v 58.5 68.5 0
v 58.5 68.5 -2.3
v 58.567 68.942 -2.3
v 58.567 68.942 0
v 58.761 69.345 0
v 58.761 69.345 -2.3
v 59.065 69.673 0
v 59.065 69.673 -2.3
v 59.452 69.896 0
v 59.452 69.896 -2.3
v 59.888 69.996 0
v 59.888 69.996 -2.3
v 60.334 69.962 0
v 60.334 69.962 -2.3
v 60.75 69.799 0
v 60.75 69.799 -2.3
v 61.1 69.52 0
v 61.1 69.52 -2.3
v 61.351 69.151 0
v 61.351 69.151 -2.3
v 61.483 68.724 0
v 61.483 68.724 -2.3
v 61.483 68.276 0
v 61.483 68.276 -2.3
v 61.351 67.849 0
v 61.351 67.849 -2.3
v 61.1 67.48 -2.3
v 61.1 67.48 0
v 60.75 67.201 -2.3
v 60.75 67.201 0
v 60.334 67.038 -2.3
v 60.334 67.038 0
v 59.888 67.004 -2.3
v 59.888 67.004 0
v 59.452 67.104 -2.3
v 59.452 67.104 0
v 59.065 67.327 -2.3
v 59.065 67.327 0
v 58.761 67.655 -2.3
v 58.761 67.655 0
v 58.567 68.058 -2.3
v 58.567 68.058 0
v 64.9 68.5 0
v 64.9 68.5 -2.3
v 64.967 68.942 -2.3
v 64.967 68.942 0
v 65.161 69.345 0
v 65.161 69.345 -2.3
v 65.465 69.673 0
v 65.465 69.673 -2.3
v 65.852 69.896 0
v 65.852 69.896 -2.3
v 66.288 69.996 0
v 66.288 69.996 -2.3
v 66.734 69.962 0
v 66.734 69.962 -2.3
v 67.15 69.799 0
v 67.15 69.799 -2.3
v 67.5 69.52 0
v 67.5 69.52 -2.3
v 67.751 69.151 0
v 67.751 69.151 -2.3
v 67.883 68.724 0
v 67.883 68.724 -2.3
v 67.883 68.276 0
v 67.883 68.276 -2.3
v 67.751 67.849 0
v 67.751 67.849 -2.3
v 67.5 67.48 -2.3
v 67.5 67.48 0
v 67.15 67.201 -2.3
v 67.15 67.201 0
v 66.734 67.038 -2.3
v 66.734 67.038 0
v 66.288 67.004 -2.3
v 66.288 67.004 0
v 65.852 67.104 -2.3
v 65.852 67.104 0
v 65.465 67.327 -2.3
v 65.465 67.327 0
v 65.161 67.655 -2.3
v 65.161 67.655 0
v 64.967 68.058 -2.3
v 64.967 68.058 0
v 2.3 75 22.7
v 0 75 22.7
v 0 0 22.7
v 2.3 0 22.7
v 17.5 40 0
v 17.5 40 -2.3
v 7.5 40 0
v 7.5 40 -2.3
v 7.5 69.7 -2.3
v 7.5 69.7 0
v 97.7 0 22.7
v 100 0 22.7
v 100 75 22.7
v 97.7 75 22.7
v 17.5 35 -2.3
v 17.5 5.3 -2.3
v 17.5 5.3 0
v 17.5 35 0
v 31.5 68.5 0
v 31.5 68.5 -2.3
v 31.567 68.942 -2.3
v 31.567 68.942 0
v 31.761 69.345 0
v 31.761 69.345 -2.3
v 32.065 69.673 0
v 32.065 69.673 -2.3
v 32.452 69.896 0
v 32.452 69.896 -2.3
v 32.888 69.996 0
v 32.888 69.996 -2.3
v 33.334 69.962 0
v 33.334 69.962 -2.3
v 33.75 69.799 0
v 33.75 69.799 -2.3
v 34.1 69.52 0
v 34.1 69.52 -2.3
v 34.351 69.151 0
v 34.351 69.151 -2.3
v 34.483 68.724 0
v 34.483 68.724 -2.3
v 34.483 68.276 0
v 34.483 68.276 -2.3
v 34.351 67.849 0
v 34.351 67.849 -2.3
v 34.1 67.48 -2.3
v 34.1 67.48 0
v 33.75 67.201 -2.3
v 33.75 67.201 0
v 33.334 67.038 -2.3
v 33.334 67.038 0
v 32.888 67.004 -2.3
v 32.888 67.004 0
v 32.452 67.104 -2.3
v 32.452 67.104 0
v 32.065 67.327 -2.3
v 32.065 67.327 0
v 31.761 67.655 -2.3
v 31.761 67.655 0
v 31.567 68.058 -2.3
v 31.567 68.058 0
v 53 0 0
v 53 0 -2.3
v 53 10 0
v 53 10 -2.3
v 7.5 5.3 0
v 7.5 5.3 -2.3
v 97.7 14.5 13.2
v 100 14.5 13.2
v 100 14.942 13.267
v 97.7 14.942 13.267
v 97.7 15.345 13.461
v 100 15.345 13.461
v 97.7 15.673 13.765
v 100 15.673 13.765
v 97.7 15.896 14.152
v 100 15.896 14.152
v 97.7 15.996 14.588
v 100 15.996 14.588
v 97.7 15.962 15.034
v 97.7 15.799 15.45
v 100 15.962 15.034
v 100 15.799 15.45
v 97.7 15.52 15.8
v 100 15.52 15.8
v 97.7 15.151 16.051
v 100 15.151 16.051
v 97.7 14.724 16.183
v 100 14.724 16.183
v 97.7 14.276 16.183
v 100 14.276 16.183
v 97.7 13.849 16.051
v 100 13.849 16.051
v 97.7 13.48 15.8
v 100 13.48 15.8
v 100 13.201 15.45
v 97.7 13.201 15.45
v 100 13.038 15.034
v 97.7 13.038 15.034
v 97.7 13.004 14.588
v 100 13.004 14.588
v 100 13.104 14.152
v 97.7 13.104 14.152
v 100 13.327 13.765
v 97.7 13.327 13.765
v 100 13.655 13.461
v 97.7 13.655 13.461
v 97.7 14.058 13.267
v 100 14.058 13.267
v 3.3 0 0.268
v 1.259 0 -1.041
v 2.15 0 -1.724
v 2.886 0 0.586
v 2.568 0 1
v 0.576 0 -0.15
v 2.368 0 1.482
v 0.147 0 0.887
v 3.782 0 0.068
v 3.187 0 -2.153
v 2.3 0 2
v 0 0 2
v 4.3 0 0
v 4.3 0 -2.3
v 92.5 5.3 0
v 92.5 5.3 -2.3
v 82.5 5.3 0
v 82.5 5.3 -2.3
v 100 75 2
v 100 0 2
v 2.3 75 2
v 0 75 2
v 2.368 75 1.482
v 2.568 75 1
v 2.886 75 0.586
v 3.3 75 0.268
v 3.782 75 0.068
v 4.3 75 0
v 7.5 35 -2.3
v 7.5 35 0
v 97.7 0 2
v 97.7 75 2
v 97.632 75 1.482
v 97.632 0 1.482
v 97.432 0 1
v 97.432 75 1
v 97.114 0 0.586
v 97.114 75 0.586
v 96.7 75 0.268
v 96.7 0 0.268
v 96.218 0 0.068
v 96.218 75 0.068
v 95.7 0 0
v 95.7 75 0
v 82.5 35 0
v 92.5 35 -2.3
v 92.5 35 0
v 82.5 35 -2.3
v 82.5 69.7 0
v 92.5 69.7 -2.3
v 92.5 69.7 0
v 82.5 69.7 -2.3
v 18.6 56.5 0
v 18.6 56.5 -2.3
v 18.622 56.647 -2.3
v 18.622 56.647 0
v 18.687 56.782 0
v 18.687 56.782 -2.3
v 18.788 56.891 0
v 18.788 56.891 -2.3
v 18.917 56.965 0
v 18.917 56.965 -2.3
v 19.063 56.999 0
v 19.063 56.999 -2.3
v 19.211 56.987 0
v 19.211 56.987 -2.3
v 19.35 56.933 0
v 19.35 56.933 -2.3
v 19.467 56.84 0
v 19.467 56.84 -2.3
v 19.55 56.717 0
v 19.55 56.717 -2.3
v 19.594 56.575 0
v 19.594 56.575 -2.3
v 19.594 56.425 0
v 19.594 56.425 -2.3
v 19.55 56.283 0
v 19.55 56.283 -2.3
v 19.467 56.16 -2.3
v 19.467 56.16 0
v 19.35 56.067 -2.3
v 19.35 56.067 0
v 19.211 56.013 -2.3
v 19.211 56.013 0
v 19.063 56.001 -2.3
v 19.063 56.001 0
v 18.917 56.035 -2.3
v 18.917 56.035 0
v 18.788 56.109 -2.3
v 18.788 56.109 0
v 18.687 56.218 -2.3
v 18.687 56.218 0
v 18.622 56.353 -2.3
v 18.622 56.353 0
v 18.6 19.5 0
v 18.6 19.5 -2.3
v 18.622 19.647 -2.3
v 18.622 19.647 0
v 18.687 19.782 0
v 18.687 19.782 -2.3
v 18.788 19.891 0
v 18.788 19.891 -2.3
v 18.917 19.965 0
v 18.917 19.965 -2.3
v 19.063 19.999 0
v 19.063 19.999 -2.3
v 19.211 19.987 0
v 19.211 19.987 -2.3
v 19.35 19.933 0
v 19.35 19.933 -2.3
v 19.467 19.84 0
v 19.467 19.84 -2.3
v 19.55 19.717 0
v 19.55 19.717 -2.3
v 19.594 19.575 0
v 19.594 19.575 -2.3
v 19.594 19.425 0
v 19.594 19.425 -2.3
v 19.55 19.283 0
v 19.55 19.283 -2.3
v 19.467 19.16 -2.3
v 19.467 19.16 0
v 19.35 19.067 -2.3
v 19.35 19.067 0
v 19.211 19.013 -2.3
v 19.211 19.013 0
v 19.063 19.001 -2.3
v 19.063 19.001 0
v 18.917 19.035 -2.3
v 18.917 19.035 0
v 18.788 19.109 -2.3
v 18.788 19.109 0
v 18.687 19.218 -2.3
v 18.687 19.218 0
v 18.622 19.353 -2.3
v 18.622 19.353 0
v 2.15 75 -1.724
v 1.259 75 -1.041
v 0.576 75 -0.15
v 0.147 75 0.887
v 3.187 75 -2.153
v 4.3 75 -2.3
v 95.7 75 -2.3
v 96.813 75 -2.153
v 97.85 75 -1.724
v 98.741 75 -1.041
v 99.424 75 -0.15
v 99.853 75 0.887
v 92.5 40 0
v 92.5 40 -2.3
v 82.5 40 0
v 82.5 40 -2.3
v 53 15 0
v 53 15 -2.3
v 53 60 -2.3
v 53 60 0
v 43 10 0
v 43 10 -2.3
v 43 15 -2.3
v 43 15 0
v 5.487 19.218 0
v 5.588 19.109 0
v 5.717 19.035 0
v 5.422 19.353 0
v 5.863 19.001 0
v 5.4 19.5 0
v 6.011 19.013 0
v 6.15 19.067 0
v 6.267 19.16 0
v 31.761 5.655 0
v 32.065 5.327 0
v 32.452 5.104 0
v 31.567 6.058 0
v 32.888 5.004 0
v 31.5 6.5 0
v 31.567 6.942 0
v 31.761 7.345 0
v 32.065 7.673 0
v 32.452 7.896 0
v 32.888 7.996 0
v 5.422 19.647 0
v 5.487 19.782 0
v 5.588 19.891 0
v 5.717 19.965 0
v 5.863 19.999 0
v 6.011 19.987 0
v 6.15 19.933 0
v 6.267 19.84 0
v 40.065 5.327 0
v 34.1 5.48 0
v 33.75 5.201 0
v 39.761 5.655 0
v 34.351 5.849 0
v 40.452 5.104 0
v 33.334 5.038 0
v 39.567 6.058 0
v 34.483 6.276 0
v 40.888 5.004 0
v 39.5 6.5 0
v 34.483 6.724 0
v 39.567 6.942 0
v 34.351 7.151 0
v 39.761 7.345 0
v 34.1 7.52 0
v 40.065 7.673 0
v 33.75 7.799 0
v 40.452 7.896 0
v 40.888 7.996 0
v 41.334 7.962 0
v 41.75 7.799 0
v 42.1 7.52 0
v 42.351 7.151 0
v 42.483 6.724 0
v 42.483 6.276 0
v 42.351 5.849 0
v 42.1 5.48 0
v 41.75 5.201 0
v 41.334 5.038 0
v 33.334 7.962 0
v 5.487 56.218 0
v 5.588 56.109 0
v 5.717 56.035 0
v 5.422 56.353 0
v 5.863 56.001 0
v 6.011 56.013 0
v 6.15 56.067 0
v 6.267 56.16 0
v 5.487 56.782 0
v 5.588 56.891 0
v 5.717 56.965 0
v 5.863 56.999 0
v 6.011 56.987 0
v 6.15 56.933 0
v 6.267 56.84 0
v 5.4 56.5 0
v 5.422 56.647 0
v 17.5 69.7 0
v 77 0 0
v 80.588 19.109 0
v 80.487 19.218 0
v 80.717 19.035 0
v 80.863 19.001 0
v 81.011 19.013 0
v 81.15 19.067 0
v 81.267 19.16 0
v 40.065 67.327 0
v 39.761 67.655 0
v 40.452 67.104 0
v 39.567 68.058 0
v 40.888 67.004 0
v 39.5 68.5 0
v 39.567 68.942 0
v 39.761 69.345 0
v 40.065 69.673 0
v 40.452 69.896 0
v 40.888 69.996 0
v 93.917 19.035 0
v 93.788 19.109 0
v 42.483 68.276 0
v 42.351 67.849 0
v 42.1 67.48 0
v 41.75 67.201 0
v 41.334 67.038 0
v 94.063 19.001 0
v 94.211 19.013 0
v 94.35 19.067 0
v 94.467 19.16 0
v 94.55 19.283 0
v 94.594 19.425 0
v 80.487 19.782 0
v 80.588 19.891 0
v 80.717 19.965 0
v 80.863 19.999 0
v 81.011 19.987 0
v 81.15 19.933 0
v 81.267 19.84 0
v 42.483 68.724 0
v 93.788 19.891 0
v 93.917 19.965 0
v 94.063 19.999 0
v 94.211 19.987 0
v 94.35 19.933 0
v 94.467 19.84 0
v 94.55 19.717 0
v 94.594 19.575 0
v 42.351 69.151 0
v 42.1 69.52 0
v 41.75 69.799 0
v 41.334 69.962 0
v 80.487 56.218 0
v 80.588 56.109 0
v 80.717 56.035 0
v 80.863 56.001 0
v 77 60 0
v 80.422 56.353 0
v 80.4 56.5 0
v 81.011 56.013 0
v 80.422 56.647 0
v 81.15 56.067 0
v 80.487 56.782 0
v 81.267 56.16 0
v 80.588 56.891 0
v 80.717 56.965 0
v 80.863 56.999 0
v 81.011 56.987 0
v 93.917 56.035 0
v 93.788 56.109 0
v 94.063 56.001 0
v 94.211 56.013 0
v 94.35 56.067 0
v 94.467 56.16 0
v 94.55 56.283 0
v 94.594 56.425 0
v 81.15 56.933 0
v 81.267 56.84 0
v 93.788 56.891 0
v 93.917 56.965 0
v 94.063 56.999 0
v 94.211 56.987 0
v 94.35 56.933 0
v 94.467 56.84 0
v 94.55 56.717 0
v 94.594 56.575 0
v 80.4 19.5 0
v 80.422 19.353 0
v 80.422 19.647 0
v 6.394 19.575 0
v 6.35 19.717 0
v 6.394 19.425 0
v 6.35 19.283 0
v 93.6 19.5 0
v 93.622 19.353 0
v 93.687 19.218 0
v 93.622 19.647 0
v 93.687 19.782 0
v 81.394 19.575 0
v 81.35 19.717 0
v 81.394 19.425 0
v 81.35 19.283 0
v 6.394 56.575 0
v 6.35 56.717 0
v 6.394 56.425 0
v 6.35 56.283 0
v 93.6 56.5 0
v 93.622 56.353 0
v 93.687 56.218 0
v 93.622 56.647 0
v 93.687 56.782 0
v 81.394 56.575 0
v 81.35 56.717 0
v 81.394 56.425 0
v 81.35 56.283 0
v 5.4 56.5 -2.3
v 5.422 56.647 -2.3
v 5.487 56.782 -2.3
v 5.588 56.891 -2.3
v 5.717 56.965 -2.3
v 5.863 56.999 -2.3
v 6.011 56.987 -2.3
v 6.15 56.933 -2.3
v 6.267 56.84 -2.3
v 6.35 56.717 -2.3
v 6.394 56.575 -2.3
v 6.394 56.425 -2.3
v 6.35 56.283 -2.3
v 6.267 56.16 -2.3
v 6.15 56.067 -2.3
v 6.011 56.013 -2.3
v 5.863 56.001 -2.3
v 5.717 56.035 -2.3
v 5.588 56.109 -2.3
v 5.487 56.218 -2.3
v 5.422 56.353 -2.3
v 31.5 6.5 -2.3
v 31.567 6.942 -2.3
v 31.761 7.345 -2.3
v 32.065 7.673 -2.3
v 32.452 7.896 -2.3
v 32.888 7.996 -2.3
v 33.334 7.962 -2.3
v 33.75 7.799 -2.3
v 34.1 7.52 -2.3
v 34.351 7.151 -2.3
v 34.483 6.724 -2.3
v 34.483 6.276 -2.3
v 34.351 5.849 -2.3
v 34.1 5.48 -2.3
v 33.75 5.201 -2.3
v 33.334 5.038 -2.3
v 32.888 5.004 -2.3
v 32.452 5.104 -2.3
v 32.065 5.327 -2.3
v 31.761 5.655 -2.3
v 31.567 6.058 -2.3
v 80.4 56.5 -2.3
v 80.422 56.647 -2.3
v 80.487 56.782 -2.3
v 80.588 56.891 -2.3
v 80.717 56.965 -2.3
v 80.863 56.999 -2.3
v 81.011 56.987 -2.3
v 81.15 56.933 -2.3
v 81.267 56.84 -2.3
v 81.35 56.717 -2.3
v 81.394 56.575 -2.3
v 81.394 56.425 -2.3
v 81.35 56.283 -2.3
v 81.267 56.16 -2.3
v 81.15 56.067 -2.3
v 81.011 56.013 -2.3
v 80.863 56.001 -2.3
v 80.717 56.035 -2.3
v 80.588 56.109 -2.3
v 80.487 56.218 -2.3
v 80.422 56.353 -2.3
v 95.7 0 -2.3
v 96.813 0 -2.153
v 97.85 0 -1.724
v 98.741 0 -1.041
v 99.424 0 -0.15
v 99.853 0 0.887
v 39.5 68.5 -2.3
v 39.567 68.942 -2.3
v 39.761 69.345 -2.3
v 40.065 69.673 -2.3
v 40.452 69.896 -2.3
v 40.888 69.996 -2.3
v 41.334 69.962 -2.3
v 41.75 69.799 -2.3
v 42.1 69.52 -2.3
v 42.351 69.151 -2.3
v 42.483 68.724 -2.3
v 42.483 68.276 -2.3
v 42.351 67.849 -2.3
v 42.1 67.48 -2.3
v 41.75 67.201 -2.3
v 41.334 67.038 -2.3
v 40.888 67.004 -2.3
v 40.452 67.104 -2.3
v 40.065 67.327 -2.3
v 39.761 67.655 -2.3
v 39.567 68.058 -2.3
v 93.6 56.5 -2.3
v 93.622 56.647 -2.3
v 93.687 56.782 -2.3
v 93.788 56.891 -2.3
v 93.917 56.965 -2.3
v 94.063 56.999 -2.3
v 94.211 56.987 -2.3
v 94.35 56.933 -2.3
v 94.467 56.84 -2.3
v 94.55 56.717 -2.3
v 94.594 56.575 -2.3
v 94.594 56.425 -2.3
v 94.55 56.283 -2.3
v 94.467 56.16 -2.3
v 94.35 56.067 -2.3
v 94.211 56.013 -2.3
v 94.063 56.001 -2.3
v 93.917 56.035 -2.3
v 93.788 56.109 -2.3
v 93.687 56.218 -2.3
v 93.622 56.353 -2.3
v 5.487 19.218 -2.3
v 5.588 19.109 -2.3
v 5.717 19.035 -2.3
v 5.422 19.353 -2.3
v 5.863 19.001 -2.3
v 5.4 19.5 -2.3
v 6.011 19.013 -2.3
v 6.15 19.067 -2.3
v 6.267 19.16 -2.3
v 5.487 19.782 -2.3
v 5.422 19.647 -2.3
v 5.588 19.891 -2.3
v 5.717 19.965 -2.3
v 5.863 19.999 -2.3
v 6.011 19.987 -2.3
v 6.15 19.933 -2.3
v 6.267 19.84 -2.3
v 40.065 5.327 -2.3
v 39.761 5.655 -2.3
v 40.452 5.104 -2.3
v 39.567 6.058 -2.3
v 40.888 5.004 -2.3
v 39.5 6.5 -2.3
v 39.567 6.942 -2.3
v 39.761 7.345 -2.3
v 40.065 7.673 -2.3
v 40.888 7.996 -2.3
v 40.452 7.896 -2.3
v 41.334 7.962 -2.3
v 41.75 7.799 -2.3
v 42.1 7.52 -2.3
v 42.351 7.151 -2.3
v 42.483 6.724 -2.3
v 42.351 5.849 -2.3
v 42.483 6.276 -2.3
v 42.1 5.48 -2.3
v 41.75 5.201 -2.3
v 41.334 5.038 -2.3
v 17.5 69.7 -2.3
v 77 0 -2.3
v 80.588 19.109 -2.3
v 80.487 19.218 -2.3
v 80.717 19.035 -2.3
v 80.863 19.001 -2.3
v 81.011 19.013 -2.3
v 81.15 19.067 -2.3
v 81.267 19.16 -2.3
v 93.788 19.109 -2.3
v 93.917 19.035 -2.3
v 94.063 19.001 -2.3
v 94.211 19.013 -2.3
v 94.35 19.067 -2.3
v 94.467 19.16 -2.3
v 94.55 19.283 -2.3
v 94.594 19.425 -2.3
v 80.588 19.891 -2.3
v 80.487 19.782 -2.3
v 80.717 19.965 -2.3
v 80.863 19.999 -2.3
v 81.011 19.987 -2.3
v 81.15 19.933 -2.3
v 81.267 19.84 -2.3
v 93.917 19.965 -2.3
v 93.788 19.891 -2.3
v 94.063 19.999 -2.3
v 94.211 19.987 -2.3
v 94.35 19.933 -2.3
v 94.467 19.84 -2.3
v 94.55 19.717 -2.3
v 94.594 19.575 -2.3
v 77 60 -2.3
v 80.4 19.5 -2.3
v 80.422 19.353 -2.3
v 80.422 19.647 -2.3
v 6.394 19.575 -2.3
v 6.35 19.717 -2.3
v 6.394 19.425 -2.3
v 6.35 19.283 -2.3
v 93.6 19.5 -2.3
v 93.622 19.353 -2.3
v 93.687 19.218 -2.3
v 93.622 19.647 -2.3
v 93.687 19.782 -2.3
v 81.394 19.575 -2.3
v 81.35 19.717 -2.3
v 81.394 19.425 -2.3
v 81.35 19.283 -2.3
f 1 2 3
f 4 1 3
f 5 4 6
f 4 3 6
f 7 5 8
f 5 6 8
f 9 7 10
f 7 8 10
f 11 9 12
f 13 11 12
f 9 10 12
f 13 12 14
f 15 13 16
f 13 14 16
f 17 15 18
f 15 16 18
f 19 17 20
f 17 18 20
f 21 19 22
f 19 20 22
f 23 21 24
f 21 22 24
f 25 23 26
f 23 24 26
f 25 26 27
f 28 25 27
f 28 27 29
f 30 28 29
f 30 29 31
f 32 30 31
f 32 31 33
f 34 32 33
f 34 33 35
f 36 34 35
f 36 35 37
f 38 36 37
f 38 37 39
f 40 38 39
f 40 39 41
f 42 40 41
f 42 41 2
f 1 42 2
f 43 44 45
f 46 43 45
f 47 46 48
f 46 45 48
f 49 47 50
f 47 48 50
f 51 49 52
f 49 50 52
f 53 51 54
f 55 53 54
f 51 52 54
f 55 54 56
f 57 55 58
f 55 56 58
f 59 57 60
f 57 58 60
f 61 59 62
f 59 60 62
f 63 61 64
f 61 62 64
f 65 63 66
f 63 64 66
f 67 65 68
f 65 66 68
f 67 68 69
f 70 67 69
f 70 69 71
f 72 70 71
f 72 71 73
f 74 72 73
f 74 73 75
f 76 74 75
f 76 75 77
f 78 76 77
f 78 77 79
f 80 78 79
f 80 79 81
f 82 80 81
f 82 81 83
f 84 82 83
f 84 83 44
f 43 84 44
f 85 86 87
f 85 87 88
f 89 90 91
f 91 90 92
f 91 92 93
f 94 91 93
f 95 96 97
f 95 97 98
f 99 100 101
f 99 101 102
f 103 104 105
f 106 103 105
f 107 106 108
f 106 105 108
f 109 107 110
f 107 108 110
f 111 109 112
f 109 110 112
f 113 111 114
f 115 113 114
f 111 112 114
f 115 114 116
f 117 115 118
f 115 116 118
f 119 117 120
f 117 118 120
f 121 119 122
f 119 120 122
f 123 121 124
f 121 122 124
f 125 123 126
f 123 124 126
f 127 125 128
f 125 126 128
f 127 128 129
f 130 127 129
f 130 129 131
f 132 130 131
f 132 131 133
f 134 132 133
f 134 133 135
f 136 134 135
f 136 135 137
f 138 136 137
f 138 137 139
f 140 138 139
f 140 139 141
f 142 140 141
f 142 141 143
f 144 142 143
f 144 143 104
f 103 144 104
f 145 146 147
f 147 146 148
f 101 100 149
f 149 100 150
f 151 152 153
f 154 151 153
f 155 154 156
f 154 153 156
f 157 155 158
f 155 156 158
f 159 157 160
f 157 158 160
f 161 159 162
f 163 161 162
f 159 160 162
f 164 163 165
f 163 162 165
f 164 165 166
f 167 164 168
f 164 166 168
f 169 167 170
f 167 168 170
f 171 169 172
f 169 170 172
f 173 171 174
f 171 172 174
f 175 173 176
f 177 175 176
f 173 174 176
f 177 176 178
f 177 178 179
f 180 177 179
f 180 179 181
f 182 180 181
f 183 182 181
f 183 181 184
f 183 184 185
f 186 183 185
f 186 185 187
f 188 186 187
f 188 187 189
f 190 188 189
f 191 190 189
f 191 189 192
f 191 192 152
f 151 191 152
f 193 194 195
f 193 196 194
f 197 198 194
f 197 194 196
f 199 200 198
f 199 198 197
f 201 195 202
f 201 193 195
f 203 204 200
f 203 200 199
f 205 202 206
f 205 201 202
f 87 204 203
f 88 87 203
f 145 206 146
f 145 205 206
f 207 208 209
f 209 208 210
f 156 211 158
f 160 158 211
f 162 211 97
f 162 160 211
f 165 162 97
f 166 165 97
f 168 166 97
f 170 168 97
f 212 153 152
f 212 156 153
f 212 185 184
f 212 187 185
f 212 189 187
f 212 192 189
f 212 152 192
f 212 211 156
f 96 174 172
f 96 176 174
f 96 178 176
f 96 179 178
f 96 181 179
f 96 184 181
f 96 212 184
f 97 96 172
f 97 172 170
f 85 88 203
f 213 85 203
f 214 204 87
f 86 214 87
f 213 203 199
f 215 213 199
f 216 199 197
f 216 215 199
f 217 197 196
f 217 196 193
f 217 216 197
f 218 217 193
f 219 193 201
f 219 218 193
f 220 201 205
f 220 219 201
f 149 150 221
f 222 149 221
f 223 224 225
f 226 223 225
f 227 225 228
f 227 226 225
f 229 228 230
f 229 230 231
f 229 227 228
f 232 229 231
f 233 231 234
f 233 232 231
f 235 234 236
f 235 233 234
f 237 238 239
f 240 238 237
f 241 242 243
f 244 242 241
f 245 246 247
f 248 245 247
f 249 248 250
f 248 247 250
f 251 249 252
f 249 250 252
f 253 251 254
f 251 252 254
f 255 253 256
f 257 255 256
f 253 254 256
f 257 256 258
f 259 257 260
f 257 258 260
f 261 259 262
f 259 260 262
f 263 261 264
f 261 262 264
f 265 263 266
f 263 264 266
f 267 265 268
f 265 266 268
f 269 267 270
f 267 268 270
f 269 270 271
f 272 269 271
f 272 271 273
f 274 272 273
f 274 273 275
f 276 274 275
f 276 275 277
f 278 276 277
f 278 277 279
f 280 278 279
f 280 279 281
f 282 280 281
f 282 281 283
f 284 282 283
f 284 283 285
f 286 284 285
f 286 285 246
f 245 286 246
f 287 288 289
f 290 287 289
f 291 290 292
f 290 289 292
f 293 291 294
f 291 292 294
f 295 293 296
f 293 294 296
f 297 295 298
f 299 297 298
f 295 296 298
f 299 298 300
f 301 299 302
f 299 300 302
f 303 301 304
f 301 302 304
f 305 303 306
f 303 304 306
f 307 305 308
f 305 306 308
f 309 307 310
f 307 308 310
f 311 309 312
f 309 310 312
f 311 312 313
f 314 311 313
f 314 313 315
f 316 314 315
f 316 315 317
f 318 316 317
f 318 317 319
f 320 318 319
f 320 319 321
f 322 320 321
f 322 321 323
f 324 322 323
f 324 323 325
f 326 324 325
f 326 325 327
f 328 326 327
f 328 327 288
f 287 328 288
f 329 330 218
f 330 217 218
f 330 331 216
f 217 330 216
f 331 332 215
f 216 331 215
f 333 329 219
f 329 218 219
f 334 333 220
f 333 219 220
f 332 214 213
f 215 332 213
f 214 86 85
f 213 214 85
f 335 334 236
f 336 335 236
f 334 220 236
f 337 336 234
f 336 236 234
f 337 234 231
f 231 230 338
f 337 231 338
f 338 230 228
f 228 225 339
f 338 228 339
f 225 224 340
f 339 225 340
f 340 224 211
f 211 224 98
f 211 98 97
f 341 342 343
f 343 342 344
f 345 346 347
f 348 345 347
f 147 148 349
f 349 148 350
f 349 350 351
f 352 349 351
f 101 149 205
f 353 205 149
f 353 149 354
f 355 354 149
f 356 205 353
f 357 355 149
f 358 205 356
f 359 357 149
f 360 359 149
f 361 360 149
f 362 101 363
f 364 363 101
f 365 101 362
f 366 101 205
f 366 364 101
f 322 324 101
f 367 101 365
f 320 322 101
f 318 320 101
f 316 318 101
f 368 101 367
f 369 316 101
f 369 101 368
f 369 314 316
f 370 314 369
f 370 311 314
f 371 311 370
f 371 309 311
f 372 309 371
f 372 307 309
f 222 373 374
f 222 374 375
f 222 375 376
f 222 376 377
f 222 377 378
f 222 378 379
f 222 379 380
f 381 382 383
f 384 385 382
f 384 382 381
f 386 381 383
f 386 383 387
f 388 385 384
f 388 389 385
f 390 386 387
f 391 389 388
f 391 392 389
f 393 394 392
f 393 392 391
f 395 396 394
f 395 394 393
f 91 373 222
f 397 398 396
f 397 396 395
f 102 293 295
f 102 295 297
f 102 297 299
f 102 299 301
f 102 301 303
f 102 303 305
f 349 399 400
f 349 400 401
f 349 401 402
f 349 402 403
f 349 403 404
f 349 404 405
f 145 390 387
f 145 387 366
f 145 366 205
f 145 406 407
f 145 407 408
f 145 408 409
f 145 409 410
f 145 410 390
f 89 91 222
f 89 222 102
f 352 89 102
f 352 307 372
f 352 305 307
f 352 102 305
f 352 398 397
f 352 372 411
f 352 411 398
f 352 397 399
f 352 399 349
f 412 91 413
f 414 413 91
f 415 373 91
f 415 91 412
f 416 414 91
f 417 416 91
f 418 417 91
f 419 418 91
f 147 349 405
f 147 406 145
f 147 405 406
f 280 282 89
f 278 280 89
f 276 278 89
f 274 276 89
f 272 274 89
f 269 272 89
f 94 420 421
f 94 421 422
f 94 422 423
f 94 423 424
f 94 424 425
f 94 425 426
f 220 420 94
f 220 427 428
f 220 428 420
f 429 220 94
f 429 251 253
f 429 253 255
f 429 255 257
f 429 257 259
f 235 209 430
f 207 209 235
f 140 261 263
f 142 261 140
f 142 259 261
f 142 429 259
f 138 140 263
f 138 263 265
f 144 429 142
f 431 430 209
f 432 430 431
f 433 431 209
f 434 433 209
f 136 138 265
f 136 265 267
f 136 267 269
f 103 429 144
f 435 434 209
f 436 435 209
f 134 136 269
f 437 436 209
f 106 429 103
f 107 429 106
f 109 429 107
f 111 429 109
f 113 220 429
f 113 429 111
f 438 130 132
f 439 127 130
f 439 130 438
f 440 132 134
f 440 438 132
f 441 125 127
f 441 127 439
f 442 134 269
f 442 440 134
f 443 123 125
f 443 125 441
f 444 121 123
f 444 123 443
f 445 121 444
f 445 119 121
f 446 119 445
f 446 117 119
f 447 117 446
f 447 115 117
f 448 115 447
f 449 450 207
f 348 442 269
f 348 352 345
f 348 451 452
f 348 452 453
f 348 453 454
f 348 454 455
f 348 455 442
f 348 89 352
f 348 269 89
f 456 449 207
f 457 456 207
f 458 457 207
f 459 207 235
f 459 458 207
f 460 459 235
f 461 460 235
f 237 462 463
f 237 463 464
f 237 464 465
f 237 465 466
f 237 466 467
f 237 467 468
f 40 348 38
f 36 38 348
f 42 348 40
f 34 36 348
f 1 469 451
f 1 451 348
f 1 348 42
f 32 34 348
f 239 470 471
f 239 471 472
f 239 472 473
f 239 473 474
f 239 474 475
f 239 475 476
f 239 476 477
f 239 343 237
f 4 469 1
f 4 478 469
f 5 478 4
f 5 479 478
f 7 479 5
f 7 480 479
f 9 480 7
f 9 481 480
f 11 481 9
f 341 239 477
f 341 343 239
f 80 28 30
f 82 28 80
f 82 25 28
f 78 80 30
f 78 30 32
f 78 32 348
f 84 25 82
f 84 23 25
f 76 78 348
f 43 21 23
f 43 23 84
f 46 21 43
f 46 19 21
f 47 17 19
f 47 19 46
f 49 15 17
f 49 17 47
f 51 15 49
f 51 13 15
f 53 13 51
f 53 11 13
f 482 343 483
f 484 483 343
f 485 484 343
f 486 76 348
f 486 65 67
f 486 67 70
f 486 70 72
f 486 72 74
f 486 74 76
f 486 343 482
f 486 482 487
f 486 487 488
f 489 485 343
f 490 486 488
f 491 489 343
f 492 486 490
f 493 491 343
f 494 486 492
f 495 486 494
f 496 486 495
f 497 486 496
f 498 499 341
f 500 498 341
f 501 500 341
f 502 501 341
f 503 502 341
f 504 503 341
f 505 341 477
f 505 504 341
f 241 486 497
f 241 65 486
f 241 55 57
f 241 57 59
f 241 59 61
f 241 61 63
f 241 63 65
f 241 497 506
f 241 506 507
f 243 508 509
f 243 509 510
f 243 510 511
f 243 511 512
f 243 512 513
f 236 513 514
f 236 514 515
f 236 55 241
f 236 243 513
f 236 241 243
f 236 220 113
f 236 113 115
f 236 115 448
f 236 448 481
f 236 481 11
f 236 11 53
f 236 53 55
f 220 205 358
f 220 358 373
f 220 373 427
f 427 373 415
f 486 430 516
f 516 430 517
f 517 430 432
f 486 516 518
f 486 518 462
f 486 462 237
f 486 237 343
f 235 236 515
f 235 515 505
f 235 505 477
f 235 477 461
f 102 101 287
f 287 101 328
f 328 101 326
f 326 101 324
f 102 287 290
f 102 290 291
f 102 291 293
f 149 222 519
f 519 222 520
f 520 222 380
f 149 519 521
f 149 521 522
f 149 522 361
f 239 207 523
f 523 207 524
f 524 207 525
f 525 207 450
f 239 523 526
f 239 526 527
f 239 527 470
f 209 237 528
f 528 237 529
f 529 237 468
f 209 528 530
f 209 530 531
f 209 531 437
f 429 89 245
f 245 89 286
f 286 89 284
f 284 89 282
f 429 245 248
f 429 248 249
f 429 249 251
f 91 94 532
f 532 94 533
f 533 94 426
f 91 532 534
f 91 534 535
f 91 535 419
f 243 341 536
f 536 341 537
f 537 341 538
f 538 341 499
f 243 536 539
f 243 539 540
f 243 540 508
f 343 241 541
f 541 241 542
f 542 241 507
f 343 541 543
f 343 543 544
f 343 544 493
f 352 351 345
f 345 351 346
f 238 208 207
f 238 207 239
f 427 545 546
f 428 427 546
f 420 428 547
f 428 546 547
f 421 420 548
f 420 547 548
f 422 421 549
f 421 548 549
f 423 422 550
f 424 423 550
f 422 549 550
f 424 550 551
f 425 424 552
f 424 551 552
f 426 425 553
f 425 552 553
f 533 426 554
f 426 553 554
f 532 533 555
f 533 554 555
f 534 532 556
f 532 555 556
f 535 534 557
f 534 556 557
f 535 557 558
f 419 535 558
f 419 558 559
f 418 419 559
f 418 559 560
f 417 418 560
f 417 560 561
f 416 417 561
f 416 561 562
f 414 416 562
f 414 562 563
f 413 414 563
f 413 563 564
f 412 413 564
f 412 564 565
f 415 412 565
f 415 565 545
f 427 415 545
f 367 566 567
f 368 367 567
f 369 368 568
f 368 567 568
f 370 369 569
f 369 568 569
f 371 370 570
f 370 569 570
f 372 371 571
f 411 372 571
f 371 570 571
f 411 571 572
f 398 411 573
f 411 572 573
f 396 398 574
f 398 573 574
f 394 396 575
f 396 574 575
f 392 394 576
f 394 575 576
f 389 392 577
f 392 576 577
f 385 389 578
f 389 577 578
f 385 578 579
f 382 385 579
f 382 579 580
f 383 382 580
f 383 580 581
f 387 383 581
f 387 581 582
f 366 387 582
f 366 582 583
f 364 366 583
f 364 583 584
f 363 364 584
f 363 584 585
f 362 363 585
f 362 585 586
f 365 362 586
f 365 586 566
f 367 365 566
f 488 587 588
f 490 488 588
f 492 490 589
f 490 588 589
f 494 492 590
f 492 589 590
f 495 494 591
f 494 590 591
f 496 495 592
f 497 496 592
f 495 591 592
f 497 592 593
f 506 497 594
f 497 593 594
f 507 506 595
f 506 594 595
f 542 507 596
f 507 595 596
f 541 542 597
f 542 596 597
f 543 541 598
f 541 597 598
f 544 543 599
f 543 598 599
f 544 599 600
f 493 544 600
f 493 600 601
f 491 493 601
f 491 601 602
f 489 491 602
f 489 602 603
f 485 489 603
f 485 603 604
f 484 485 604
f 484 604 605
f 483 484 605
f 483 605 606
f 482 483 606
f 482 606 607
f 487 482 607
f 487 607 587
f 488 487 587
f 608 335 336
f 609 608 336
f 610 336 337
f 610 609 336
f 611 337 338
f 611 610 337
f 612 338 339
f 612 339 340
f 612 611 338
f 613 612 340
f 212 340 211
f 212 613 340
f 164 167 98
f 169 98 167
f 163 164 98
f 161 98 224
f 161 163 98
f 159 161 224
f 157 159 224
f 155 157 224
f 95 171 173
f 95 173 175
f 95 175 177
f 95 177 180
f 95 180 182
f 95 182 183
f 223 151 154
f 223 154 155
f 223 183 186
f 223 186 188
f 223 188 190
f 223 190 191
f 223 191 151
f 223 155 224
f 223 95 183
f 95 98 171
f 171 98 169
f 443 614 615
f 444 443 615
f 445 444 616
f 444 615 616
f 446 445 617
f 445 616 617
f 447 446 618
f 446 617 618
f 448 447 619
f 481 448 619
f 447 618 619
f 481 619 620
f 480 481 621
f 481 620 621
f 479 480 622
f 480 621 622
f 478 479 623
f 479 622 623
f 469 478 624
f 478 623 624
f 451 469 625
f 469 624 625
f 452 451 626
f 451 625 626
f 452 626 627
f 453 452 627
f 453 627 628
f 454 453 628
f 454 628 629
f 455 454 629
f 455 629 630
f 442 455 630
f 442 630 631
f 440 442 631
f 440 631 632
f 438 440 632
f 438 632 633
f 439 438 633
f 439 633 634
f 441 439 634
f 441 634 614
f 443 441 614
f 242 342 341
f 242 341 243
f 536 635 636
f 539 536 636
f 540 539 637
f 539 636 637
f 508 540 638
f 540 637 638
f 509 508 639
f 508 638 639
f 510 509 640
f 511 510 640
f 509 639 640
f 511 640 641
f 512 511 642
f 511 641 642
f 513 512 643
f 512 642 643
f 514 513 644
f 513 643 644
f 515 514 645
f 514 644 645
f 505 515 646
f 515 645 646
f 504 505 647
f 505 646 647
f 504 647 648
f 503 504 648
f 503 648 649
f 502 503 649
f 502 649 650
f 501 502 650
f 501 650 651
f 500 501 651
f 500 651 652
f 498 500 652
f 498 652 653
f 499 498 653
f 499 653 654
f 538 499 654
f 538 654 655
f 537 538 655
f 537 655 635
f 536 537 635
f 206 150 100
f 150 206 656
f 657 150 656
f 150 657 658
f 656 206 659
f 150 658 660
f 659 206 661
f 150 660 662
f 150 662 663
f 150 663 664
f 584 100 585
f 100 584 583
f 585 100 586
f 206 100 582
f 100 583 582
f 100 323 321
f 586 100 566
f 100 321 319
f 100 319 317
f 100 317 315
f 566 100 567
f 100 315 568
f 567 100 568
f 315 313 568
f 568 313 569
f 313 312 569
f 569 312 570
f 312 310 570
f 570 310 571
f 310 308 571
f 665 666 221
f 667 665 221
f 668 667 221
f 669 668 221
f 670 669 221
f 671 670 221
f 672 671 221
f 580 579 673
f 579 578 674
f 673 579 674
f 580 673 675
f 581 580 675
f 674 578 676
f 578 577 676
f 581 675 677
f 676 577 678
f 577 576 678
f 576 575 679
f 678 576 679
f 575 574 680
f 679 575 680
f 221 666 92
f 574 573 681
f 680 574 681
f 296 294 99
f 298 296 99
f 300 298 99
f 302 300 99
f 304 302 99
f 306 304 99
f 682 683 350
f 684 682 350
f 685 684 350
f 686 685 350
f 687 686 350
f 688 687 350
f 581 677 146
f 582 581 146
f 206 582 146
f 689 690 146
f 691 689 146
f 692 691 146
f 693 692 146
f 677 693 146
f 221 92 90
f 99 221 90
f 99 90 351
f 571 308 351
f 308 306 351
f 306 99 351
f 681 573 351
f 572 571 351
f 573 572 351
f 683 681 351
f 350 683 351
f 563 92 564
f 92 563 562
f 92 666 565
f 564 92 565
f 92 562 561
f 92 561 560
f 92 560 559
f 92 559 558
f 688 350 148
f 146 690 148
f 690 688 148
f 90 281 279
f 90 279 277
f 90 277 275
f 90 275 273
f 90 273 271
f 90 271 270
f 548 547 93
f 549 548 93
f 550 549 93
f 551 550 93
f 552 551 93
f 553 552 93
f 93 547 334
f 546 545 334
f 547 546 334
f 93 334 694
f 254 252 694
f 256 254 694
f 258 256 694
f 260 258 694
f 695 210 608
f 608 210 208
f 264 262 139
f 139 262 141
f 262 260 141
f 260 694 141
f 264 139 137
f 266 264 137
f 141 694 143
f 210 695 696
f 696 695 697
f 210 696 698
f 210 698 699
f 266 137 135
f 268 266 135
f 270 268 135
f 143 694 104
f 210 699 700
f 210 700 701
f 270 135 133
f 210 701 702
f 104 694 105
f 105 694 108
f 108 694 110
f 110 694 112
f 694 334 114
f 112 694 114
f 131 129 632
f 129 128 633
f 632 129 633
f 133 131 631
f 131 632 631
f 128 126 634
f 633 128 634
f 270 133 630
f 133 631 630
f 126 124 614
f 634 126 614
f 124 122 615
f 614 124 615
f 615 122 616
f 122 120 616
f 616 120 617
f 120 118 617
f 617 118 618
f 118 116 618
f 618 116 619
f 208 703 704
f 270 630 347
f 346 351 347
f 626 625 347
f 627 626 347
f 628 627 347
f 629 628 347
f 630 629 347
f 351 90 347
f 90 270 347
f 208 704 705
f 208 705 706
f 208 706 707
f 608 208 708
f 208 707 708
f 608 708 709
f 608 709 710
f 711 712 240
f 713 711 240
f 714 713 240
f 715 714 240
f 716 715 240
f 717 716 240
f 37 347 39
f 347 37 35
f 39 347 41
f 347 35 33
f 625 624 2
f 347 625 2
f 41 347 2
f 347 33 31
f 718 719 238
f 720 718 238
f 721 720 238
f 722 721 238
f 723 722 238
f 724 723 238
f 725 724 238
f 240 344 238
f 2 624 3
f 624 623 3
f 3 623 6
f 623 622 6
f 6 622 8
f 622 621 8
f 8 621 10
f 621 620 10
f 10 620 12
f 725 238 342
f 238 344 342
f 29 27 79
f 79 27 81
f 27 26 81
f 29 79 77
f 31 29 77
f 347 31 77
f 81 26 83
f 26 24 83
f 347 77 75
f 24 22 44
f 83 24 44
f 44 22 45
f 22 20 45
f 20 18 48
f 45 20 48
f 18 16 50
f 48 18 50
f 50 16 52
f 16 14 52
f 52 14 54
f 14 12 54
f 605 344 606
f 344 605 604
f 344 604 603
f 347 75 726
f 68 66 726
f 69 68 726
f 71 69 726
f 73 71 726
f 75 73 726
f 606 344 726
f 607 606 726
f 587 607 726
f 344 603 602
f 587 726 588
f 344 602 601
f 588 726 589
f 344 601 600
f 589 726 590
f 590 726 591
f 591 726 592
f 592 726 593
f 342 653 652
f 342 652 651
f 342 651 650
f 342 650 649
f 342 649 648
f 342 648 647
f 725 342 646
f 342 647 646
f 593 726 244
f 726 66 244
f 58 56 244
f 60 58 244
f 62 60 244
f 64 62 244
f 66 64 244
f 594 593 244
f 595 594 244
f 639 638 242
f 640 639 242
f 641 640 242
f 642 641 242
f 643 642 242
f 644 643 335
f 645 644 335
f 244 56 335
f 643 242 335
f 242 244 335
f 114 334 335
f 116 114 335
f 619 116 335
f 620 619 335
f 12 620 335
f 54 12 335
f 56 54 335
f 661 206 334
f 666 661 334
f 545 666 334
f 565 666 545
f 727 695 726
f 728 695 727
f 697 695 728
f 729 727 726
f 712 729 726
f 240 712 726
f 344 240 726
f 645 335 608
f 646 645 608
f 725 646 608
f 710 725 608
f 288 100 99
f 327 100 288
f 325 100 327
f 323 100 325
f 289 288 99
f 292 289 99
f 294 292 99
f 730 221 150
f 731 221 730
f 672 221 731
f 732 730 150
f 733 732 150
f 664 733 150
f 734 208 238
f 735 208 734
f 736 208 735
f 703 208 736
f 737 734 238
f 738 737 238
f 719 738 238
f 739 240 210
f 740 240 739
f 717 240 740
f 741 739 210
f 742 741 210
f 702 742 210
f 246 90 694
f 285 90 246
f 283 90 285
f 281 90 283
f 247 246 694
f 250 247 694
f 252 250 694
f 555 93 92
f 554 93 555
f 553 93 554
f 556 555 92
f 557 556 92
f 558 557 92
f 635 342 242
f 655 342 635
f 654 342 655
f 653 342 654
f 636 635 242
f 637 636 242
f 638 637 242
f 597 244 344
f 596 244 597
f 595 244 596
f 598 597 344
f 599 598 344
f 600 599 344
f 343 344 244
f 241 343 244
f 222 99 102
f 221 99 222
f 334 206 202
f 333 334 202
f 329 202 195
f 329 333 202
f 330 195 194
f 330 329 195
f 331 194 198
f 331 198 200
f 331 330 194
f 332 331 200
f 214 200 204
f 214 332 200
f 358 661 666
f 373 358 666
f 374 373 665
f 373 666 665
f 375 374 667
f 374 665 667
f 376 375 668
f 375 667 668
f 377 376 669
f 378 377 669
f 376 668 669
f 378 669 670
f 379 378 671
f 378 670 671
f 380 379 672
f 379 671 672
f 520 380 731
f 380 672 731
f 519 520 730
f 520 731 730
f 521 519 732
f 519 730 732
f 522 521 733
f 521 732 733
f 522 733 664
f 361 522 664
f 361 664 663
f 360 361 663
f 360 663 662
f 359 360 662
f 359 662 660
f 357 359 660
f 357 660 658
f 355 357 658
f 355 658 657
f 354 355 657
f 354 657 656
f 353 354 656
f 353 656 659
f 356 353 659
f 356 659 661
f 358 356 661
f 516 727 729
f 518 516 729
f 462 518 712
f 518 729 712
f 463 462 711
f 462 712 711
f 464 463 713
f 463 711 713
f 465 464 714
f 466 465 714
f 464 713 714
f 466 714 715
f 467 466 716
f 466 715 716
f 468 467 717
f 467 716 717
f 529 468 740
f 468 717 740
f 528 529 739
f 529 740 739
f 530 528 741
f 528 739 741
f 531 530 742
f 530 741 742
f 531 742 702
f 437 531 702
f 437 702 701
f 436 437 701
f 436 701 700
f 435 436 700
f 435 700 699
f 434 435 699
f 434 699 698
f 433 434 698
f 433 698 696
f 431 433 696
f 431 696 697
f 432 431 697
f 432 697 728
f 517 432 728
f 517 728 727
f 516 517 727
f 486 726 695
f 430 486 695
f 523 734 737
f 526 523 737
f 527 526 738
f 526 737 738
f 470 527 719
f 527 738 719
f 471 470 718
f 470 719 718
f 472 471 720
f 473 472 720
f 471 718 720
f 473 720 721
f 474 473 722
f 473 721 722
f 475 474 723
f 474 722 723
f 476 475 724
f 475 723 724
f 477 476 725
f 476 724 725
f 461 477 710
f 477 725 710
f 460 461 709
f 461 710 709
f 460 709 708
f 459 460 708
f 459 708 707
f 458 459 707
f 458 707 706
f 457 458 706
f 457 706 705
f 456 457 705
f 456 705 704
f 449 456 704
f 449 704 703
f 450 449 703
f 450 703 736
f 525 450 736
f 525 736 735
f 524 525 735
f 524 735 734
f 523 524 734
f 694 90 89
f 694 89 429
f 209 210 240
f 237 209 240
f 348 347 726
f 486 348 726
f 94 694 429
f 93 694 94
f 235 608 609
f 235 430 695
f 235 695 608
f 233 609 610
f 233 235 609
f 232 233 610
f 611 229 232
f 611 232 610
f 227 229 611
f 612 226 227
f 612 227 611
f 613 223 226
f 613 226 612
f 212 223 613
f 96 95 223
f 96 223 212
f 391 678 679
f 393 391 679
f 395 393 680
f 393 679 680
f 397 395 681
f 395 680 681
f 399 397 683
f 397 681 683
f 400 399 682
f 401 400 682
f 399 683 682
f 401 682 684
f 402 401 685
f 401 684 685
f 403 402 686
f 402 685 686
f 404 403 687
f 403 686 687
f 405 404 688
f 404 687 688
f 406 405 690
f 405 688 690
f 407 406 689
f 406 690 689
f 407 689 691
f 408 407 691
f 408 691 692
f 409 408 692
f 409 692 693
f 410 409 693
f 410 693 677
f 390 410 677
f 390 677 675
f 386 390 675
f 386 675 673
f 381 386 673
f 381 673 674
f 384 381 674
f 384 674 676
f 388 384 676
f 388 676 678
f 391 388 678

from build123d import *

# Parameters (mm, degrees)
SKETCH2_W                    = 100
SKETCH2_H                    = 75
BASE_FLANGE1_DEPTH           = 2.3
EDGE_FLANGE1_STRIP_W         = 13.2
EDGE_FLANGE1_STRIP_H         = 2.3
EDGE_FLANGE1_STRIP_CUT_DEPTH = 75
EDGE_FLANGE1_DEPTH           = 75
EDGE_FLANGE2_STRIP_W         = 13.2
EDGE_FLANGE2_STRIP_H         = 2.3
EDGE_FLANGE2_STRIP_CUT_DEPTH = 75
EDGE_FLANGE2_DEPTH           = 75
CUT_EXTRUDE1_REACH           = 129.475
SKETCH13_R                   = 1.5
SKETCH13_W                   = 10
SKETCH13_H                   = 64.4
SKETCH14_W                   = 10
SKETCH14_H                   = 5
TAB1_DEPTH                   = 2.3
CUT_EXTRUDE2_REACH           = 129.475
SKETCH17_R                   = 0.5
CUT_EXTRUDE3_REACH           = 129.044
SKETCH18_R                   = 1.5


# Sheet-metal steps are written as plain solids
with BuildPart() as part:
    # Sketch2 → Base-Flange1 (new body)
    with BuildSketch(Plane.XY):
        with Locations((50, 37.5)):
            Rectangle(SKETCH2_W, SKETCH2_H)
    extrude(amount=-BASE_FLANGE1_DEPTH)

    # Edge-Flange1 strip (across the edge) → Edge-Flange1 strip cut (cut)
    with BuildSketch(Plane.XZ.offset(-75)):
        with Locations((-2.3, -1.15)):
            Rectangle(EDGE_FLANGE1_STRIP_W, EDGE_FLANGE1_STRIP_H)
    extrude(amount=EDGE_FLANGE1_STRIP_CUT_DEPTH, mode=Mode.SUBTRACT)

    # Edge-Flange1 section (across the edge) → Edge-Flange1 (add)
    with BuildSketch(Plane.XZ.offset(-75)):
        with BuildLine():
            Line((0, 2), (0, 22.7))
            Line((0, 22.7), (2.3, 22.7))
            Line((2.3, 22.7), (2.3, 2))
            ThreePointArc((2.3, 2), (2.885786438, 0.585786438), (4.3, 0))
            Line((4.3, 0), (4.3, -2.3))
            ThreePointArc((4.3, -2.3), (1.259440841, -1.040559159), (0, 2))
        make_face()
    extrude(amount=EDGE_FLANGE1_DEPTH)

    # Edge-Flange2 strip (across the edge) → Edge-Flange2 strip cut (cut)
    with BuildSketch(Plane(origin=(100, 0, 0), x_dir=(-1, 0, 0), z_dir=(0, 1, 0))):
        with Locations((-2.3, -1.15)):
            Rectangle(EDGE_FLANGE2_STRIP_W, EDGE_FLANGE2_STRIP_H)
    extrude(amount=EDGE_FLANGE2_STRIP_CUT_DEPTH, mode=Mode.SUBTRACT)

    # Edge-Flange2 section (across the edge) → Edge-Flange2 (add)
    with BuildSketch(Plane(origin=(100, 0, 0), x_dir=(-1, 0, 0), z_dir=(0, 1, 0))):
        with BuildLine():
            Line((0, 2), (0, 22.7))
            Line((0, 22.7), (2.3, 22.7))
            Line((2.3, 22.7), (2.3, 2))
            ThreePointArc((2.3, 2), (2.885786438, 0.585786438), (4.3, 0))
            Line((4.3, 0), (4.3, -2.3))
            ThreePointArc((4.3, -2.3), (1.259440841, -1.040559159), (0, 2))
        make_face()
    extrude(amount=EDGE_FLANGE2_DEPTH)

    # Sketch13 → Cut-Extrude1 (cut, up to next)
    with BuildSketch(Plane(origin=(0, 0, -2.3), x_dir=(-1, 0, 0), z_dir=(0, 0, -1)), mode=Mode.PRIVATE) as cut_extrude1_sk1:
        with Locations((-66.4, 68.5)):
            Circle(SKETCH13_R)
    cut_extrude1_tool1 = extrude(cut_extrude1_sk1.sketch, amount=-CUT_EXTRUDE1_REACH, mode=Mode.PRIVATE) & part.part
    # Sketch13 → Cut-Extrude1 (cut, up to next)
    with BuildSketch(Plane(origin=(0, 0, -2.3), x_dir=(-1, 0, 0), z_dir=(0, 0, -1)), mode=Mode.PRIVATE) as cut_extrude1_sk2:
        with Locations((-60, 68.5)):
            Circle(SKETCH13_R)
    cut_extrude1_tool2 = extrude(cut_extrude1_sk2.sketch, amount=-CUT_EXTRUDE1_REACH, mode=Mode.PRIVATE) & part.part
    # Sketch13 → Cut-Extrude1 (cut, up to next)
    with BuildSketch(Plane(origin=(0, 0, -2.3), x_dir=(-1, 0, 0), z_dir=(0, 0, -1)), mode=Mode.PRIVATE) as cut_extrude1_sk3:
        with Locations((-41, 68.5)):
            Circle(SKETCH13_R)
    cut_extrude1_tool3 = extrude(cut_extrude1_sk3.sketch, amount=-CUT_EXTRUDE1_REACH, mode=Mode.PRIVATE) & part.part
    # Sketch13 → Cut-Extrude1 (cut, up to next)
    with BuildSketch(Plane(origin=(0, 0, -2.3), x_dir=(-1, 0, 0), z_dir=(0, 0, -1)), mode=Mode.PRIVATE) as cut_extrude1_sk4:
        with Locations((-33, 68.5)):
            Circle(SKETCH13_R)
    cut_extrude1_tool4 = extrude(cut_extrude1_sk4.sketch, amount=-CUT_EXTRUDE1_REACH, mode=Mode.PRIVATE) & part.part
    # Sketch13 → Cut-Extrude1 (cut, up to next)
    with BuildSketch(Plane(origin=(0, 0, -2.3), x_dir=(-1, 0, 0), z_dir=(0, 0, -1)), mode=Mode.PRIVATE) as cut_extrude1_sk5:
        with Locations((-41, 6.5)):
            Circle(SKETCH13_R)
    cut_extrude1_tool5 = extrude(cut_extrude1_sk5.sketch, amount=-CUT_EXTRUDE1_REACH, mode=Mode.PRIVATE) & part.part
    # Sketch13 → Cut-Extrude1 (cut, up to next)
    with BuildSketch(Plane(origin=(0, 0, -2.3), x_dir=(-1, 0, 0), z_dir=(0, 0, -1)), mode=Mode.PRIVATE) as cut_extrude1_sk6:
        with Locations((-33, 6.5)):
            Circle(SKETCH13_R)
    cut_extrude1_tool6 = extrude(cut_extrude1_sk6.sketch, amount=-CUT_EXTRUDE1_REACH, mode=Mode.PRIVATE) & part.part
    # Sketch13 → Cut-Extrude1 (cut, up to next)
    with BuildSketch(Plane(origin=(0, 0, -2.3), x_dir=(-1, 0, 0), z_dir=(0, 0, -1)), mode=Mode.PRIVATE) as cut_extrude1_sk7:
        Polygon((-77, 0), (-53, 0), (-53, 10), (-43, 10), (-43, 15), (-53, 15), (-53, 60), (-77, 60), align=None)
    cut_extrude1_tool7 = extrude(cut_extrude1_sk7.sketch, amount=-CUT_EXTRUDE1_REACH, mode=Mode.PRIVATE) & part.part
    # Sketch13 → Cut-Extrude1 (cut, up to next)
    with BuildSketch(Plane(origin=(0, 0, -2.3), x_dir=(-1, 0, 0), z_dir=(0, 0, -1)), mode=Mode.PRIVATE) as cut_extrude1_sk8:
        with Locations((-87.5, 37.5)):
            Rectangle(SKETCH13_W, SKETCH13_H)
    cut_extrude1_tool8 = extrude(cut_extrude1_sk8.sketch, amount=-CUT_EXTRUDE1_REACH, mode=Mode.PRIVATE) & part.part
    # Sketch13 → Cut-Extrude1 (cut, up to next)
    with BuildSketch(Plane(origin=(0, 0, -2.3), x_dir=(-1, 0, 0), z_dir=(0, 0, -1)), mode=Mode.PRIVATE) as cut_extrude1_sk9:
        with Locations((-12.5, 37.5)):
            Rectangle(SKETCH13_W, SKETCH13_H)
    cut_extrude1_tool9 = extrude(cut_extrude1_sk9.sketch, amount=-CUT_EXTRUDE1_REACH, mode=Mode.PRIVATE) & part.part
    add(cut_extrude1_tool1.solids().sort_by_distance((66.4, 68.5, -2.3))[0], mode=Mode.SUBTRACT)
    add(cut_extrude1_tool2.solids().sort_by_distance((60, 68.5, -2.3))[0], mode=Mode.SUBTRACT)
    add(cut_extrude1_tool3.solids().sort_by_distance((41, 68.5, -2.3))[0], mode=Mode.SUBTRACT)
    add(cut_extrude1_tool4.solids().sort_by_distance((33, 68.5, -2.3))[0], mode=Mode.SUBTRACT)
    add(cut_extrude1_tool5.solids().sort_by_distance((41, 6.5, -2.3))[0], mode=Mode.SUBTRACT)
    add(cut_extrude1_tool6.solids().sort_by_distance((33, 6.5, -2.3))[0], mode=Mode.SUBTRACT)
    add(cut_extrude1_tool7.solids().sort_by_distance((64.42953, 29.412752, -2.3))[0], mode=Mode.SUBTRACT)
    add(cut_extrude1_tool8.solids().sort_by_distance((87.5, 37.5, -2.3))[0], mode=Mode.SUBTRACT)
    add(cut_extrude1_tool9.solids().sort_by_distance((12.5, 37.5, -2.3))[0], mode=Mode.SUBTRACT)

    # Sketch14 → Tab1 (add)
    with BuildSketch(Plane(origin=(0, 0, -2.3), x_dir=(-1, 0, 0), z_dir=(0, 0, -1))):
        with Locations((-87.5, 37.5)):
            Rectangle(SKETCH14_W, SKETCH14_H)
        with Locations((-12.5, 37.5)):
            Rectangle(SKETCH14_W, SKETCH14_H)
    extrude(amount=-TAB1_DEPTH)

    # Sketch17 → Cut-Extrude2 (cut, up to next)
    with BuildSketch(Plane(origin=(0, 0, -2.3), x_dir=(-1, 0, 0), z_dir=(0, 0, -1)), mode=Mode.PRIVATE) as cut_extrude2_sk1:
        with Locations((-94.1, 56.5)):
            Circle(SKETCH17_R)
    cut_extrude2_tool1 = extrude(cut_extrude2_sk1.sketch, amount=-CUT_EXTRUDE2_REACH, mode=Mode.PRIVATE) & part.part
    # Sketch17 → Cut-Extrude2 (cut, up to next)
    with BuildSketch(Plane(origin=(0, 0, -2.3), x_dir=(-1, 0, 0), z_dir=(0, 0, -1)), mode=Mode.PRIVATE) as cut_extrude2_sk2:
        with Locations((-94.1, 19.5)):
            Circle(SKETCH17_R)
    cut_extrude2_tool2 = extrude(cut_extrude2_sk2.sketch, amount=-CUT_EXTRUDE2_REACH, mode=Mode.PRIVATE) & part.part
    # Sketch17 → Cut-Extrude2 (cut, up to next)
    with BuildSketch(Plane(origin=(0, 0, -2.3), x_dir=(-1, 0, 0), z_dir=(0, 0, -1)), mode=Mode.PRIVATE) as cut_extrude2_sk3:
        with Locations((-80.9, 19.5)):
            Circle(SKETCH17_R)
    cut_extrude2_tool3 = extrude(cut_extrude2_sk3.sketch, amount=-CUT_EXTRUDE2_REACH, mode=Mode.PRIVATE) & part.part
    # Sketch17 → Cut-Extrude2 (cut, up to next)
    with BuildSketch(Plane(origin=(0, 0, -2.3), x_dir=(-1, 0, 0), z_dir=(0, 0, -1)), mode=Mode.PRIVATE) as cut_extrude2_sk4:
        with Locations((-80.9, 56.5)):
            Circle(SKETCH17_R)
    cut_extrude2_tool4 = extrude(cut_extrude2_sk4.sketch, amount=-CUT_EXTRUDE2_REACH, mode=Mode.PRIVATE) & part.part
    # Sketch17 → Cut-Extrude2 (cut, up to next)
    with BuildSketch(Plane(origin=(0, 0, -2.3), x_dir=(-1, 0, 0), z_dir=(0, 0, -1)), mode=Mode.PRIVATE) as cut_extrude2_sk5:
        with Locations((-19.1, 19.5)):
            Circle(SKETCH17_R)
    cut_extrude2_tool5 = extrude(cut_extrude2_sk5.sketch, amount=-CUT_EXTRUDE2_REACH, mode=Mode.PRIVATE) & part.part
    # Sketch17 → Cut-Extrude2 (cut, up to next)
    with BuildSketch(Plane(origin=(0, 0, -2.3), x_dir=(-1, 0, 0), z_dir=(0, 0, -1)), mode=Mode.PRIVATE) as cut_extrude2_sk6:
        with Locations((-5.9, 19.5)):
            Circle(SKETCH17_R)
    cut_extrude2_tool6 = extrude(cut_extrude2_sk6.sketch, amount=-CUT_EXTRUDE2_REACH, mode=Mode.PRIVATE) & part.part
    # Sketch17 → Cut-Extrude2 (cut, up to next)
    with BuildSketch(Plane(origin=(0, 0, -2.3), x_dir=(-1, 0, 0), z_dir=(0, 0, -1)), mode=Mode.PRIVATE) as cut_extrude2_sk7:
        with Locations((-5.9, 56.5)):
            Circle(SKETCH17_R)
    cut_extrude2_tool7 = extrude(cut_extrude2_sk7.sketch, amount=-CUT_EXTRUDE2_REACH, mode=Mode.PRIVATE) & part.part
    # Sketch17 → Cut-Extrude2 (cut, up to next)
    with BuildSketch(Plane(origin=(0, 0, -2.3), x_dir=(-1, 0, 0), z_dir=(0, 0, -1)), mode=Mode.PRIVATE) as cut_extrude2_sk8:
        with Locations((-19.1, 56.5)):
            Circle(SKETCH17_R)
    cut_extrude2_tool8 = extrude(cut_extrude2_sk8.sketch, amount=-CUT_EXTRUDE2_REACH, mode=Mode.PRIVATE) & part.part
    add(cut_extrude2_tool1.solids().sort_by_distance((94.1, 56.5, -2.3))[0], mode=Mode.SUBTRACT)
    add(cut_extrude2_tool2.solids().sort_by_distance((94.1, 19.5, -2.3))[0], mode=Mode.SUBTRACT)
    add(cut_extrude2_tool3.solids().sort_by_distance((80.9, 19.5, -2.3))[0], mode=Mode.SUBTRACT)
    add(cut_extrude2_tool4.solids().sort_by_distance((80.9, 56.5, -2.3))[0], mode=Mode.SUBTRACT)
    add(cut_extrude2_tool5.solids().sort_by_distance((19.1, 19.5, -2.3))[0], mode=Mode.SUBTRACT)
    add(cut_extrude2_tool6.solids().sort_by_distance((5.9, 19.5, -2.3))[0], mode=Mode.SUBTRACT)
    add(cut_extrude2_tool7.solids().sort_by_distance((5.9, 56.5, -2.3))[0], mode=Mode.SUBTRACT)
    add(cut_extrude2_tool8.solids().sort_by_distance((19.1, 56.5, -2.3))[0], mode=Mode.SUBTRACT)

    # Sketch18 → Cut-Extrude3 (cut, up to next)
    with BuildSketch(Plane(origin=(100, 0, 0), x_dir=(0, 0, -1), z_dir=(1, 0, 0)), mode=Mode.PRIVATE) as cut_extrude3_sk1:
        with Locations((-14.7, 14.5)):
            Circle(SKETCH18_R)
    cut_extrude3_tool1 = extrude(cut_extrude3_sk1.sketch, amount=-CUT_EXTRUDE3_REACH, mode=Mode.PRIVATE) & part.part
    add(cut_extrude3_tool1.solids().sort_by_distance((100, 14.5, 14.7))[0], mode=Mode.SUBTRACT)


solid = part.part
